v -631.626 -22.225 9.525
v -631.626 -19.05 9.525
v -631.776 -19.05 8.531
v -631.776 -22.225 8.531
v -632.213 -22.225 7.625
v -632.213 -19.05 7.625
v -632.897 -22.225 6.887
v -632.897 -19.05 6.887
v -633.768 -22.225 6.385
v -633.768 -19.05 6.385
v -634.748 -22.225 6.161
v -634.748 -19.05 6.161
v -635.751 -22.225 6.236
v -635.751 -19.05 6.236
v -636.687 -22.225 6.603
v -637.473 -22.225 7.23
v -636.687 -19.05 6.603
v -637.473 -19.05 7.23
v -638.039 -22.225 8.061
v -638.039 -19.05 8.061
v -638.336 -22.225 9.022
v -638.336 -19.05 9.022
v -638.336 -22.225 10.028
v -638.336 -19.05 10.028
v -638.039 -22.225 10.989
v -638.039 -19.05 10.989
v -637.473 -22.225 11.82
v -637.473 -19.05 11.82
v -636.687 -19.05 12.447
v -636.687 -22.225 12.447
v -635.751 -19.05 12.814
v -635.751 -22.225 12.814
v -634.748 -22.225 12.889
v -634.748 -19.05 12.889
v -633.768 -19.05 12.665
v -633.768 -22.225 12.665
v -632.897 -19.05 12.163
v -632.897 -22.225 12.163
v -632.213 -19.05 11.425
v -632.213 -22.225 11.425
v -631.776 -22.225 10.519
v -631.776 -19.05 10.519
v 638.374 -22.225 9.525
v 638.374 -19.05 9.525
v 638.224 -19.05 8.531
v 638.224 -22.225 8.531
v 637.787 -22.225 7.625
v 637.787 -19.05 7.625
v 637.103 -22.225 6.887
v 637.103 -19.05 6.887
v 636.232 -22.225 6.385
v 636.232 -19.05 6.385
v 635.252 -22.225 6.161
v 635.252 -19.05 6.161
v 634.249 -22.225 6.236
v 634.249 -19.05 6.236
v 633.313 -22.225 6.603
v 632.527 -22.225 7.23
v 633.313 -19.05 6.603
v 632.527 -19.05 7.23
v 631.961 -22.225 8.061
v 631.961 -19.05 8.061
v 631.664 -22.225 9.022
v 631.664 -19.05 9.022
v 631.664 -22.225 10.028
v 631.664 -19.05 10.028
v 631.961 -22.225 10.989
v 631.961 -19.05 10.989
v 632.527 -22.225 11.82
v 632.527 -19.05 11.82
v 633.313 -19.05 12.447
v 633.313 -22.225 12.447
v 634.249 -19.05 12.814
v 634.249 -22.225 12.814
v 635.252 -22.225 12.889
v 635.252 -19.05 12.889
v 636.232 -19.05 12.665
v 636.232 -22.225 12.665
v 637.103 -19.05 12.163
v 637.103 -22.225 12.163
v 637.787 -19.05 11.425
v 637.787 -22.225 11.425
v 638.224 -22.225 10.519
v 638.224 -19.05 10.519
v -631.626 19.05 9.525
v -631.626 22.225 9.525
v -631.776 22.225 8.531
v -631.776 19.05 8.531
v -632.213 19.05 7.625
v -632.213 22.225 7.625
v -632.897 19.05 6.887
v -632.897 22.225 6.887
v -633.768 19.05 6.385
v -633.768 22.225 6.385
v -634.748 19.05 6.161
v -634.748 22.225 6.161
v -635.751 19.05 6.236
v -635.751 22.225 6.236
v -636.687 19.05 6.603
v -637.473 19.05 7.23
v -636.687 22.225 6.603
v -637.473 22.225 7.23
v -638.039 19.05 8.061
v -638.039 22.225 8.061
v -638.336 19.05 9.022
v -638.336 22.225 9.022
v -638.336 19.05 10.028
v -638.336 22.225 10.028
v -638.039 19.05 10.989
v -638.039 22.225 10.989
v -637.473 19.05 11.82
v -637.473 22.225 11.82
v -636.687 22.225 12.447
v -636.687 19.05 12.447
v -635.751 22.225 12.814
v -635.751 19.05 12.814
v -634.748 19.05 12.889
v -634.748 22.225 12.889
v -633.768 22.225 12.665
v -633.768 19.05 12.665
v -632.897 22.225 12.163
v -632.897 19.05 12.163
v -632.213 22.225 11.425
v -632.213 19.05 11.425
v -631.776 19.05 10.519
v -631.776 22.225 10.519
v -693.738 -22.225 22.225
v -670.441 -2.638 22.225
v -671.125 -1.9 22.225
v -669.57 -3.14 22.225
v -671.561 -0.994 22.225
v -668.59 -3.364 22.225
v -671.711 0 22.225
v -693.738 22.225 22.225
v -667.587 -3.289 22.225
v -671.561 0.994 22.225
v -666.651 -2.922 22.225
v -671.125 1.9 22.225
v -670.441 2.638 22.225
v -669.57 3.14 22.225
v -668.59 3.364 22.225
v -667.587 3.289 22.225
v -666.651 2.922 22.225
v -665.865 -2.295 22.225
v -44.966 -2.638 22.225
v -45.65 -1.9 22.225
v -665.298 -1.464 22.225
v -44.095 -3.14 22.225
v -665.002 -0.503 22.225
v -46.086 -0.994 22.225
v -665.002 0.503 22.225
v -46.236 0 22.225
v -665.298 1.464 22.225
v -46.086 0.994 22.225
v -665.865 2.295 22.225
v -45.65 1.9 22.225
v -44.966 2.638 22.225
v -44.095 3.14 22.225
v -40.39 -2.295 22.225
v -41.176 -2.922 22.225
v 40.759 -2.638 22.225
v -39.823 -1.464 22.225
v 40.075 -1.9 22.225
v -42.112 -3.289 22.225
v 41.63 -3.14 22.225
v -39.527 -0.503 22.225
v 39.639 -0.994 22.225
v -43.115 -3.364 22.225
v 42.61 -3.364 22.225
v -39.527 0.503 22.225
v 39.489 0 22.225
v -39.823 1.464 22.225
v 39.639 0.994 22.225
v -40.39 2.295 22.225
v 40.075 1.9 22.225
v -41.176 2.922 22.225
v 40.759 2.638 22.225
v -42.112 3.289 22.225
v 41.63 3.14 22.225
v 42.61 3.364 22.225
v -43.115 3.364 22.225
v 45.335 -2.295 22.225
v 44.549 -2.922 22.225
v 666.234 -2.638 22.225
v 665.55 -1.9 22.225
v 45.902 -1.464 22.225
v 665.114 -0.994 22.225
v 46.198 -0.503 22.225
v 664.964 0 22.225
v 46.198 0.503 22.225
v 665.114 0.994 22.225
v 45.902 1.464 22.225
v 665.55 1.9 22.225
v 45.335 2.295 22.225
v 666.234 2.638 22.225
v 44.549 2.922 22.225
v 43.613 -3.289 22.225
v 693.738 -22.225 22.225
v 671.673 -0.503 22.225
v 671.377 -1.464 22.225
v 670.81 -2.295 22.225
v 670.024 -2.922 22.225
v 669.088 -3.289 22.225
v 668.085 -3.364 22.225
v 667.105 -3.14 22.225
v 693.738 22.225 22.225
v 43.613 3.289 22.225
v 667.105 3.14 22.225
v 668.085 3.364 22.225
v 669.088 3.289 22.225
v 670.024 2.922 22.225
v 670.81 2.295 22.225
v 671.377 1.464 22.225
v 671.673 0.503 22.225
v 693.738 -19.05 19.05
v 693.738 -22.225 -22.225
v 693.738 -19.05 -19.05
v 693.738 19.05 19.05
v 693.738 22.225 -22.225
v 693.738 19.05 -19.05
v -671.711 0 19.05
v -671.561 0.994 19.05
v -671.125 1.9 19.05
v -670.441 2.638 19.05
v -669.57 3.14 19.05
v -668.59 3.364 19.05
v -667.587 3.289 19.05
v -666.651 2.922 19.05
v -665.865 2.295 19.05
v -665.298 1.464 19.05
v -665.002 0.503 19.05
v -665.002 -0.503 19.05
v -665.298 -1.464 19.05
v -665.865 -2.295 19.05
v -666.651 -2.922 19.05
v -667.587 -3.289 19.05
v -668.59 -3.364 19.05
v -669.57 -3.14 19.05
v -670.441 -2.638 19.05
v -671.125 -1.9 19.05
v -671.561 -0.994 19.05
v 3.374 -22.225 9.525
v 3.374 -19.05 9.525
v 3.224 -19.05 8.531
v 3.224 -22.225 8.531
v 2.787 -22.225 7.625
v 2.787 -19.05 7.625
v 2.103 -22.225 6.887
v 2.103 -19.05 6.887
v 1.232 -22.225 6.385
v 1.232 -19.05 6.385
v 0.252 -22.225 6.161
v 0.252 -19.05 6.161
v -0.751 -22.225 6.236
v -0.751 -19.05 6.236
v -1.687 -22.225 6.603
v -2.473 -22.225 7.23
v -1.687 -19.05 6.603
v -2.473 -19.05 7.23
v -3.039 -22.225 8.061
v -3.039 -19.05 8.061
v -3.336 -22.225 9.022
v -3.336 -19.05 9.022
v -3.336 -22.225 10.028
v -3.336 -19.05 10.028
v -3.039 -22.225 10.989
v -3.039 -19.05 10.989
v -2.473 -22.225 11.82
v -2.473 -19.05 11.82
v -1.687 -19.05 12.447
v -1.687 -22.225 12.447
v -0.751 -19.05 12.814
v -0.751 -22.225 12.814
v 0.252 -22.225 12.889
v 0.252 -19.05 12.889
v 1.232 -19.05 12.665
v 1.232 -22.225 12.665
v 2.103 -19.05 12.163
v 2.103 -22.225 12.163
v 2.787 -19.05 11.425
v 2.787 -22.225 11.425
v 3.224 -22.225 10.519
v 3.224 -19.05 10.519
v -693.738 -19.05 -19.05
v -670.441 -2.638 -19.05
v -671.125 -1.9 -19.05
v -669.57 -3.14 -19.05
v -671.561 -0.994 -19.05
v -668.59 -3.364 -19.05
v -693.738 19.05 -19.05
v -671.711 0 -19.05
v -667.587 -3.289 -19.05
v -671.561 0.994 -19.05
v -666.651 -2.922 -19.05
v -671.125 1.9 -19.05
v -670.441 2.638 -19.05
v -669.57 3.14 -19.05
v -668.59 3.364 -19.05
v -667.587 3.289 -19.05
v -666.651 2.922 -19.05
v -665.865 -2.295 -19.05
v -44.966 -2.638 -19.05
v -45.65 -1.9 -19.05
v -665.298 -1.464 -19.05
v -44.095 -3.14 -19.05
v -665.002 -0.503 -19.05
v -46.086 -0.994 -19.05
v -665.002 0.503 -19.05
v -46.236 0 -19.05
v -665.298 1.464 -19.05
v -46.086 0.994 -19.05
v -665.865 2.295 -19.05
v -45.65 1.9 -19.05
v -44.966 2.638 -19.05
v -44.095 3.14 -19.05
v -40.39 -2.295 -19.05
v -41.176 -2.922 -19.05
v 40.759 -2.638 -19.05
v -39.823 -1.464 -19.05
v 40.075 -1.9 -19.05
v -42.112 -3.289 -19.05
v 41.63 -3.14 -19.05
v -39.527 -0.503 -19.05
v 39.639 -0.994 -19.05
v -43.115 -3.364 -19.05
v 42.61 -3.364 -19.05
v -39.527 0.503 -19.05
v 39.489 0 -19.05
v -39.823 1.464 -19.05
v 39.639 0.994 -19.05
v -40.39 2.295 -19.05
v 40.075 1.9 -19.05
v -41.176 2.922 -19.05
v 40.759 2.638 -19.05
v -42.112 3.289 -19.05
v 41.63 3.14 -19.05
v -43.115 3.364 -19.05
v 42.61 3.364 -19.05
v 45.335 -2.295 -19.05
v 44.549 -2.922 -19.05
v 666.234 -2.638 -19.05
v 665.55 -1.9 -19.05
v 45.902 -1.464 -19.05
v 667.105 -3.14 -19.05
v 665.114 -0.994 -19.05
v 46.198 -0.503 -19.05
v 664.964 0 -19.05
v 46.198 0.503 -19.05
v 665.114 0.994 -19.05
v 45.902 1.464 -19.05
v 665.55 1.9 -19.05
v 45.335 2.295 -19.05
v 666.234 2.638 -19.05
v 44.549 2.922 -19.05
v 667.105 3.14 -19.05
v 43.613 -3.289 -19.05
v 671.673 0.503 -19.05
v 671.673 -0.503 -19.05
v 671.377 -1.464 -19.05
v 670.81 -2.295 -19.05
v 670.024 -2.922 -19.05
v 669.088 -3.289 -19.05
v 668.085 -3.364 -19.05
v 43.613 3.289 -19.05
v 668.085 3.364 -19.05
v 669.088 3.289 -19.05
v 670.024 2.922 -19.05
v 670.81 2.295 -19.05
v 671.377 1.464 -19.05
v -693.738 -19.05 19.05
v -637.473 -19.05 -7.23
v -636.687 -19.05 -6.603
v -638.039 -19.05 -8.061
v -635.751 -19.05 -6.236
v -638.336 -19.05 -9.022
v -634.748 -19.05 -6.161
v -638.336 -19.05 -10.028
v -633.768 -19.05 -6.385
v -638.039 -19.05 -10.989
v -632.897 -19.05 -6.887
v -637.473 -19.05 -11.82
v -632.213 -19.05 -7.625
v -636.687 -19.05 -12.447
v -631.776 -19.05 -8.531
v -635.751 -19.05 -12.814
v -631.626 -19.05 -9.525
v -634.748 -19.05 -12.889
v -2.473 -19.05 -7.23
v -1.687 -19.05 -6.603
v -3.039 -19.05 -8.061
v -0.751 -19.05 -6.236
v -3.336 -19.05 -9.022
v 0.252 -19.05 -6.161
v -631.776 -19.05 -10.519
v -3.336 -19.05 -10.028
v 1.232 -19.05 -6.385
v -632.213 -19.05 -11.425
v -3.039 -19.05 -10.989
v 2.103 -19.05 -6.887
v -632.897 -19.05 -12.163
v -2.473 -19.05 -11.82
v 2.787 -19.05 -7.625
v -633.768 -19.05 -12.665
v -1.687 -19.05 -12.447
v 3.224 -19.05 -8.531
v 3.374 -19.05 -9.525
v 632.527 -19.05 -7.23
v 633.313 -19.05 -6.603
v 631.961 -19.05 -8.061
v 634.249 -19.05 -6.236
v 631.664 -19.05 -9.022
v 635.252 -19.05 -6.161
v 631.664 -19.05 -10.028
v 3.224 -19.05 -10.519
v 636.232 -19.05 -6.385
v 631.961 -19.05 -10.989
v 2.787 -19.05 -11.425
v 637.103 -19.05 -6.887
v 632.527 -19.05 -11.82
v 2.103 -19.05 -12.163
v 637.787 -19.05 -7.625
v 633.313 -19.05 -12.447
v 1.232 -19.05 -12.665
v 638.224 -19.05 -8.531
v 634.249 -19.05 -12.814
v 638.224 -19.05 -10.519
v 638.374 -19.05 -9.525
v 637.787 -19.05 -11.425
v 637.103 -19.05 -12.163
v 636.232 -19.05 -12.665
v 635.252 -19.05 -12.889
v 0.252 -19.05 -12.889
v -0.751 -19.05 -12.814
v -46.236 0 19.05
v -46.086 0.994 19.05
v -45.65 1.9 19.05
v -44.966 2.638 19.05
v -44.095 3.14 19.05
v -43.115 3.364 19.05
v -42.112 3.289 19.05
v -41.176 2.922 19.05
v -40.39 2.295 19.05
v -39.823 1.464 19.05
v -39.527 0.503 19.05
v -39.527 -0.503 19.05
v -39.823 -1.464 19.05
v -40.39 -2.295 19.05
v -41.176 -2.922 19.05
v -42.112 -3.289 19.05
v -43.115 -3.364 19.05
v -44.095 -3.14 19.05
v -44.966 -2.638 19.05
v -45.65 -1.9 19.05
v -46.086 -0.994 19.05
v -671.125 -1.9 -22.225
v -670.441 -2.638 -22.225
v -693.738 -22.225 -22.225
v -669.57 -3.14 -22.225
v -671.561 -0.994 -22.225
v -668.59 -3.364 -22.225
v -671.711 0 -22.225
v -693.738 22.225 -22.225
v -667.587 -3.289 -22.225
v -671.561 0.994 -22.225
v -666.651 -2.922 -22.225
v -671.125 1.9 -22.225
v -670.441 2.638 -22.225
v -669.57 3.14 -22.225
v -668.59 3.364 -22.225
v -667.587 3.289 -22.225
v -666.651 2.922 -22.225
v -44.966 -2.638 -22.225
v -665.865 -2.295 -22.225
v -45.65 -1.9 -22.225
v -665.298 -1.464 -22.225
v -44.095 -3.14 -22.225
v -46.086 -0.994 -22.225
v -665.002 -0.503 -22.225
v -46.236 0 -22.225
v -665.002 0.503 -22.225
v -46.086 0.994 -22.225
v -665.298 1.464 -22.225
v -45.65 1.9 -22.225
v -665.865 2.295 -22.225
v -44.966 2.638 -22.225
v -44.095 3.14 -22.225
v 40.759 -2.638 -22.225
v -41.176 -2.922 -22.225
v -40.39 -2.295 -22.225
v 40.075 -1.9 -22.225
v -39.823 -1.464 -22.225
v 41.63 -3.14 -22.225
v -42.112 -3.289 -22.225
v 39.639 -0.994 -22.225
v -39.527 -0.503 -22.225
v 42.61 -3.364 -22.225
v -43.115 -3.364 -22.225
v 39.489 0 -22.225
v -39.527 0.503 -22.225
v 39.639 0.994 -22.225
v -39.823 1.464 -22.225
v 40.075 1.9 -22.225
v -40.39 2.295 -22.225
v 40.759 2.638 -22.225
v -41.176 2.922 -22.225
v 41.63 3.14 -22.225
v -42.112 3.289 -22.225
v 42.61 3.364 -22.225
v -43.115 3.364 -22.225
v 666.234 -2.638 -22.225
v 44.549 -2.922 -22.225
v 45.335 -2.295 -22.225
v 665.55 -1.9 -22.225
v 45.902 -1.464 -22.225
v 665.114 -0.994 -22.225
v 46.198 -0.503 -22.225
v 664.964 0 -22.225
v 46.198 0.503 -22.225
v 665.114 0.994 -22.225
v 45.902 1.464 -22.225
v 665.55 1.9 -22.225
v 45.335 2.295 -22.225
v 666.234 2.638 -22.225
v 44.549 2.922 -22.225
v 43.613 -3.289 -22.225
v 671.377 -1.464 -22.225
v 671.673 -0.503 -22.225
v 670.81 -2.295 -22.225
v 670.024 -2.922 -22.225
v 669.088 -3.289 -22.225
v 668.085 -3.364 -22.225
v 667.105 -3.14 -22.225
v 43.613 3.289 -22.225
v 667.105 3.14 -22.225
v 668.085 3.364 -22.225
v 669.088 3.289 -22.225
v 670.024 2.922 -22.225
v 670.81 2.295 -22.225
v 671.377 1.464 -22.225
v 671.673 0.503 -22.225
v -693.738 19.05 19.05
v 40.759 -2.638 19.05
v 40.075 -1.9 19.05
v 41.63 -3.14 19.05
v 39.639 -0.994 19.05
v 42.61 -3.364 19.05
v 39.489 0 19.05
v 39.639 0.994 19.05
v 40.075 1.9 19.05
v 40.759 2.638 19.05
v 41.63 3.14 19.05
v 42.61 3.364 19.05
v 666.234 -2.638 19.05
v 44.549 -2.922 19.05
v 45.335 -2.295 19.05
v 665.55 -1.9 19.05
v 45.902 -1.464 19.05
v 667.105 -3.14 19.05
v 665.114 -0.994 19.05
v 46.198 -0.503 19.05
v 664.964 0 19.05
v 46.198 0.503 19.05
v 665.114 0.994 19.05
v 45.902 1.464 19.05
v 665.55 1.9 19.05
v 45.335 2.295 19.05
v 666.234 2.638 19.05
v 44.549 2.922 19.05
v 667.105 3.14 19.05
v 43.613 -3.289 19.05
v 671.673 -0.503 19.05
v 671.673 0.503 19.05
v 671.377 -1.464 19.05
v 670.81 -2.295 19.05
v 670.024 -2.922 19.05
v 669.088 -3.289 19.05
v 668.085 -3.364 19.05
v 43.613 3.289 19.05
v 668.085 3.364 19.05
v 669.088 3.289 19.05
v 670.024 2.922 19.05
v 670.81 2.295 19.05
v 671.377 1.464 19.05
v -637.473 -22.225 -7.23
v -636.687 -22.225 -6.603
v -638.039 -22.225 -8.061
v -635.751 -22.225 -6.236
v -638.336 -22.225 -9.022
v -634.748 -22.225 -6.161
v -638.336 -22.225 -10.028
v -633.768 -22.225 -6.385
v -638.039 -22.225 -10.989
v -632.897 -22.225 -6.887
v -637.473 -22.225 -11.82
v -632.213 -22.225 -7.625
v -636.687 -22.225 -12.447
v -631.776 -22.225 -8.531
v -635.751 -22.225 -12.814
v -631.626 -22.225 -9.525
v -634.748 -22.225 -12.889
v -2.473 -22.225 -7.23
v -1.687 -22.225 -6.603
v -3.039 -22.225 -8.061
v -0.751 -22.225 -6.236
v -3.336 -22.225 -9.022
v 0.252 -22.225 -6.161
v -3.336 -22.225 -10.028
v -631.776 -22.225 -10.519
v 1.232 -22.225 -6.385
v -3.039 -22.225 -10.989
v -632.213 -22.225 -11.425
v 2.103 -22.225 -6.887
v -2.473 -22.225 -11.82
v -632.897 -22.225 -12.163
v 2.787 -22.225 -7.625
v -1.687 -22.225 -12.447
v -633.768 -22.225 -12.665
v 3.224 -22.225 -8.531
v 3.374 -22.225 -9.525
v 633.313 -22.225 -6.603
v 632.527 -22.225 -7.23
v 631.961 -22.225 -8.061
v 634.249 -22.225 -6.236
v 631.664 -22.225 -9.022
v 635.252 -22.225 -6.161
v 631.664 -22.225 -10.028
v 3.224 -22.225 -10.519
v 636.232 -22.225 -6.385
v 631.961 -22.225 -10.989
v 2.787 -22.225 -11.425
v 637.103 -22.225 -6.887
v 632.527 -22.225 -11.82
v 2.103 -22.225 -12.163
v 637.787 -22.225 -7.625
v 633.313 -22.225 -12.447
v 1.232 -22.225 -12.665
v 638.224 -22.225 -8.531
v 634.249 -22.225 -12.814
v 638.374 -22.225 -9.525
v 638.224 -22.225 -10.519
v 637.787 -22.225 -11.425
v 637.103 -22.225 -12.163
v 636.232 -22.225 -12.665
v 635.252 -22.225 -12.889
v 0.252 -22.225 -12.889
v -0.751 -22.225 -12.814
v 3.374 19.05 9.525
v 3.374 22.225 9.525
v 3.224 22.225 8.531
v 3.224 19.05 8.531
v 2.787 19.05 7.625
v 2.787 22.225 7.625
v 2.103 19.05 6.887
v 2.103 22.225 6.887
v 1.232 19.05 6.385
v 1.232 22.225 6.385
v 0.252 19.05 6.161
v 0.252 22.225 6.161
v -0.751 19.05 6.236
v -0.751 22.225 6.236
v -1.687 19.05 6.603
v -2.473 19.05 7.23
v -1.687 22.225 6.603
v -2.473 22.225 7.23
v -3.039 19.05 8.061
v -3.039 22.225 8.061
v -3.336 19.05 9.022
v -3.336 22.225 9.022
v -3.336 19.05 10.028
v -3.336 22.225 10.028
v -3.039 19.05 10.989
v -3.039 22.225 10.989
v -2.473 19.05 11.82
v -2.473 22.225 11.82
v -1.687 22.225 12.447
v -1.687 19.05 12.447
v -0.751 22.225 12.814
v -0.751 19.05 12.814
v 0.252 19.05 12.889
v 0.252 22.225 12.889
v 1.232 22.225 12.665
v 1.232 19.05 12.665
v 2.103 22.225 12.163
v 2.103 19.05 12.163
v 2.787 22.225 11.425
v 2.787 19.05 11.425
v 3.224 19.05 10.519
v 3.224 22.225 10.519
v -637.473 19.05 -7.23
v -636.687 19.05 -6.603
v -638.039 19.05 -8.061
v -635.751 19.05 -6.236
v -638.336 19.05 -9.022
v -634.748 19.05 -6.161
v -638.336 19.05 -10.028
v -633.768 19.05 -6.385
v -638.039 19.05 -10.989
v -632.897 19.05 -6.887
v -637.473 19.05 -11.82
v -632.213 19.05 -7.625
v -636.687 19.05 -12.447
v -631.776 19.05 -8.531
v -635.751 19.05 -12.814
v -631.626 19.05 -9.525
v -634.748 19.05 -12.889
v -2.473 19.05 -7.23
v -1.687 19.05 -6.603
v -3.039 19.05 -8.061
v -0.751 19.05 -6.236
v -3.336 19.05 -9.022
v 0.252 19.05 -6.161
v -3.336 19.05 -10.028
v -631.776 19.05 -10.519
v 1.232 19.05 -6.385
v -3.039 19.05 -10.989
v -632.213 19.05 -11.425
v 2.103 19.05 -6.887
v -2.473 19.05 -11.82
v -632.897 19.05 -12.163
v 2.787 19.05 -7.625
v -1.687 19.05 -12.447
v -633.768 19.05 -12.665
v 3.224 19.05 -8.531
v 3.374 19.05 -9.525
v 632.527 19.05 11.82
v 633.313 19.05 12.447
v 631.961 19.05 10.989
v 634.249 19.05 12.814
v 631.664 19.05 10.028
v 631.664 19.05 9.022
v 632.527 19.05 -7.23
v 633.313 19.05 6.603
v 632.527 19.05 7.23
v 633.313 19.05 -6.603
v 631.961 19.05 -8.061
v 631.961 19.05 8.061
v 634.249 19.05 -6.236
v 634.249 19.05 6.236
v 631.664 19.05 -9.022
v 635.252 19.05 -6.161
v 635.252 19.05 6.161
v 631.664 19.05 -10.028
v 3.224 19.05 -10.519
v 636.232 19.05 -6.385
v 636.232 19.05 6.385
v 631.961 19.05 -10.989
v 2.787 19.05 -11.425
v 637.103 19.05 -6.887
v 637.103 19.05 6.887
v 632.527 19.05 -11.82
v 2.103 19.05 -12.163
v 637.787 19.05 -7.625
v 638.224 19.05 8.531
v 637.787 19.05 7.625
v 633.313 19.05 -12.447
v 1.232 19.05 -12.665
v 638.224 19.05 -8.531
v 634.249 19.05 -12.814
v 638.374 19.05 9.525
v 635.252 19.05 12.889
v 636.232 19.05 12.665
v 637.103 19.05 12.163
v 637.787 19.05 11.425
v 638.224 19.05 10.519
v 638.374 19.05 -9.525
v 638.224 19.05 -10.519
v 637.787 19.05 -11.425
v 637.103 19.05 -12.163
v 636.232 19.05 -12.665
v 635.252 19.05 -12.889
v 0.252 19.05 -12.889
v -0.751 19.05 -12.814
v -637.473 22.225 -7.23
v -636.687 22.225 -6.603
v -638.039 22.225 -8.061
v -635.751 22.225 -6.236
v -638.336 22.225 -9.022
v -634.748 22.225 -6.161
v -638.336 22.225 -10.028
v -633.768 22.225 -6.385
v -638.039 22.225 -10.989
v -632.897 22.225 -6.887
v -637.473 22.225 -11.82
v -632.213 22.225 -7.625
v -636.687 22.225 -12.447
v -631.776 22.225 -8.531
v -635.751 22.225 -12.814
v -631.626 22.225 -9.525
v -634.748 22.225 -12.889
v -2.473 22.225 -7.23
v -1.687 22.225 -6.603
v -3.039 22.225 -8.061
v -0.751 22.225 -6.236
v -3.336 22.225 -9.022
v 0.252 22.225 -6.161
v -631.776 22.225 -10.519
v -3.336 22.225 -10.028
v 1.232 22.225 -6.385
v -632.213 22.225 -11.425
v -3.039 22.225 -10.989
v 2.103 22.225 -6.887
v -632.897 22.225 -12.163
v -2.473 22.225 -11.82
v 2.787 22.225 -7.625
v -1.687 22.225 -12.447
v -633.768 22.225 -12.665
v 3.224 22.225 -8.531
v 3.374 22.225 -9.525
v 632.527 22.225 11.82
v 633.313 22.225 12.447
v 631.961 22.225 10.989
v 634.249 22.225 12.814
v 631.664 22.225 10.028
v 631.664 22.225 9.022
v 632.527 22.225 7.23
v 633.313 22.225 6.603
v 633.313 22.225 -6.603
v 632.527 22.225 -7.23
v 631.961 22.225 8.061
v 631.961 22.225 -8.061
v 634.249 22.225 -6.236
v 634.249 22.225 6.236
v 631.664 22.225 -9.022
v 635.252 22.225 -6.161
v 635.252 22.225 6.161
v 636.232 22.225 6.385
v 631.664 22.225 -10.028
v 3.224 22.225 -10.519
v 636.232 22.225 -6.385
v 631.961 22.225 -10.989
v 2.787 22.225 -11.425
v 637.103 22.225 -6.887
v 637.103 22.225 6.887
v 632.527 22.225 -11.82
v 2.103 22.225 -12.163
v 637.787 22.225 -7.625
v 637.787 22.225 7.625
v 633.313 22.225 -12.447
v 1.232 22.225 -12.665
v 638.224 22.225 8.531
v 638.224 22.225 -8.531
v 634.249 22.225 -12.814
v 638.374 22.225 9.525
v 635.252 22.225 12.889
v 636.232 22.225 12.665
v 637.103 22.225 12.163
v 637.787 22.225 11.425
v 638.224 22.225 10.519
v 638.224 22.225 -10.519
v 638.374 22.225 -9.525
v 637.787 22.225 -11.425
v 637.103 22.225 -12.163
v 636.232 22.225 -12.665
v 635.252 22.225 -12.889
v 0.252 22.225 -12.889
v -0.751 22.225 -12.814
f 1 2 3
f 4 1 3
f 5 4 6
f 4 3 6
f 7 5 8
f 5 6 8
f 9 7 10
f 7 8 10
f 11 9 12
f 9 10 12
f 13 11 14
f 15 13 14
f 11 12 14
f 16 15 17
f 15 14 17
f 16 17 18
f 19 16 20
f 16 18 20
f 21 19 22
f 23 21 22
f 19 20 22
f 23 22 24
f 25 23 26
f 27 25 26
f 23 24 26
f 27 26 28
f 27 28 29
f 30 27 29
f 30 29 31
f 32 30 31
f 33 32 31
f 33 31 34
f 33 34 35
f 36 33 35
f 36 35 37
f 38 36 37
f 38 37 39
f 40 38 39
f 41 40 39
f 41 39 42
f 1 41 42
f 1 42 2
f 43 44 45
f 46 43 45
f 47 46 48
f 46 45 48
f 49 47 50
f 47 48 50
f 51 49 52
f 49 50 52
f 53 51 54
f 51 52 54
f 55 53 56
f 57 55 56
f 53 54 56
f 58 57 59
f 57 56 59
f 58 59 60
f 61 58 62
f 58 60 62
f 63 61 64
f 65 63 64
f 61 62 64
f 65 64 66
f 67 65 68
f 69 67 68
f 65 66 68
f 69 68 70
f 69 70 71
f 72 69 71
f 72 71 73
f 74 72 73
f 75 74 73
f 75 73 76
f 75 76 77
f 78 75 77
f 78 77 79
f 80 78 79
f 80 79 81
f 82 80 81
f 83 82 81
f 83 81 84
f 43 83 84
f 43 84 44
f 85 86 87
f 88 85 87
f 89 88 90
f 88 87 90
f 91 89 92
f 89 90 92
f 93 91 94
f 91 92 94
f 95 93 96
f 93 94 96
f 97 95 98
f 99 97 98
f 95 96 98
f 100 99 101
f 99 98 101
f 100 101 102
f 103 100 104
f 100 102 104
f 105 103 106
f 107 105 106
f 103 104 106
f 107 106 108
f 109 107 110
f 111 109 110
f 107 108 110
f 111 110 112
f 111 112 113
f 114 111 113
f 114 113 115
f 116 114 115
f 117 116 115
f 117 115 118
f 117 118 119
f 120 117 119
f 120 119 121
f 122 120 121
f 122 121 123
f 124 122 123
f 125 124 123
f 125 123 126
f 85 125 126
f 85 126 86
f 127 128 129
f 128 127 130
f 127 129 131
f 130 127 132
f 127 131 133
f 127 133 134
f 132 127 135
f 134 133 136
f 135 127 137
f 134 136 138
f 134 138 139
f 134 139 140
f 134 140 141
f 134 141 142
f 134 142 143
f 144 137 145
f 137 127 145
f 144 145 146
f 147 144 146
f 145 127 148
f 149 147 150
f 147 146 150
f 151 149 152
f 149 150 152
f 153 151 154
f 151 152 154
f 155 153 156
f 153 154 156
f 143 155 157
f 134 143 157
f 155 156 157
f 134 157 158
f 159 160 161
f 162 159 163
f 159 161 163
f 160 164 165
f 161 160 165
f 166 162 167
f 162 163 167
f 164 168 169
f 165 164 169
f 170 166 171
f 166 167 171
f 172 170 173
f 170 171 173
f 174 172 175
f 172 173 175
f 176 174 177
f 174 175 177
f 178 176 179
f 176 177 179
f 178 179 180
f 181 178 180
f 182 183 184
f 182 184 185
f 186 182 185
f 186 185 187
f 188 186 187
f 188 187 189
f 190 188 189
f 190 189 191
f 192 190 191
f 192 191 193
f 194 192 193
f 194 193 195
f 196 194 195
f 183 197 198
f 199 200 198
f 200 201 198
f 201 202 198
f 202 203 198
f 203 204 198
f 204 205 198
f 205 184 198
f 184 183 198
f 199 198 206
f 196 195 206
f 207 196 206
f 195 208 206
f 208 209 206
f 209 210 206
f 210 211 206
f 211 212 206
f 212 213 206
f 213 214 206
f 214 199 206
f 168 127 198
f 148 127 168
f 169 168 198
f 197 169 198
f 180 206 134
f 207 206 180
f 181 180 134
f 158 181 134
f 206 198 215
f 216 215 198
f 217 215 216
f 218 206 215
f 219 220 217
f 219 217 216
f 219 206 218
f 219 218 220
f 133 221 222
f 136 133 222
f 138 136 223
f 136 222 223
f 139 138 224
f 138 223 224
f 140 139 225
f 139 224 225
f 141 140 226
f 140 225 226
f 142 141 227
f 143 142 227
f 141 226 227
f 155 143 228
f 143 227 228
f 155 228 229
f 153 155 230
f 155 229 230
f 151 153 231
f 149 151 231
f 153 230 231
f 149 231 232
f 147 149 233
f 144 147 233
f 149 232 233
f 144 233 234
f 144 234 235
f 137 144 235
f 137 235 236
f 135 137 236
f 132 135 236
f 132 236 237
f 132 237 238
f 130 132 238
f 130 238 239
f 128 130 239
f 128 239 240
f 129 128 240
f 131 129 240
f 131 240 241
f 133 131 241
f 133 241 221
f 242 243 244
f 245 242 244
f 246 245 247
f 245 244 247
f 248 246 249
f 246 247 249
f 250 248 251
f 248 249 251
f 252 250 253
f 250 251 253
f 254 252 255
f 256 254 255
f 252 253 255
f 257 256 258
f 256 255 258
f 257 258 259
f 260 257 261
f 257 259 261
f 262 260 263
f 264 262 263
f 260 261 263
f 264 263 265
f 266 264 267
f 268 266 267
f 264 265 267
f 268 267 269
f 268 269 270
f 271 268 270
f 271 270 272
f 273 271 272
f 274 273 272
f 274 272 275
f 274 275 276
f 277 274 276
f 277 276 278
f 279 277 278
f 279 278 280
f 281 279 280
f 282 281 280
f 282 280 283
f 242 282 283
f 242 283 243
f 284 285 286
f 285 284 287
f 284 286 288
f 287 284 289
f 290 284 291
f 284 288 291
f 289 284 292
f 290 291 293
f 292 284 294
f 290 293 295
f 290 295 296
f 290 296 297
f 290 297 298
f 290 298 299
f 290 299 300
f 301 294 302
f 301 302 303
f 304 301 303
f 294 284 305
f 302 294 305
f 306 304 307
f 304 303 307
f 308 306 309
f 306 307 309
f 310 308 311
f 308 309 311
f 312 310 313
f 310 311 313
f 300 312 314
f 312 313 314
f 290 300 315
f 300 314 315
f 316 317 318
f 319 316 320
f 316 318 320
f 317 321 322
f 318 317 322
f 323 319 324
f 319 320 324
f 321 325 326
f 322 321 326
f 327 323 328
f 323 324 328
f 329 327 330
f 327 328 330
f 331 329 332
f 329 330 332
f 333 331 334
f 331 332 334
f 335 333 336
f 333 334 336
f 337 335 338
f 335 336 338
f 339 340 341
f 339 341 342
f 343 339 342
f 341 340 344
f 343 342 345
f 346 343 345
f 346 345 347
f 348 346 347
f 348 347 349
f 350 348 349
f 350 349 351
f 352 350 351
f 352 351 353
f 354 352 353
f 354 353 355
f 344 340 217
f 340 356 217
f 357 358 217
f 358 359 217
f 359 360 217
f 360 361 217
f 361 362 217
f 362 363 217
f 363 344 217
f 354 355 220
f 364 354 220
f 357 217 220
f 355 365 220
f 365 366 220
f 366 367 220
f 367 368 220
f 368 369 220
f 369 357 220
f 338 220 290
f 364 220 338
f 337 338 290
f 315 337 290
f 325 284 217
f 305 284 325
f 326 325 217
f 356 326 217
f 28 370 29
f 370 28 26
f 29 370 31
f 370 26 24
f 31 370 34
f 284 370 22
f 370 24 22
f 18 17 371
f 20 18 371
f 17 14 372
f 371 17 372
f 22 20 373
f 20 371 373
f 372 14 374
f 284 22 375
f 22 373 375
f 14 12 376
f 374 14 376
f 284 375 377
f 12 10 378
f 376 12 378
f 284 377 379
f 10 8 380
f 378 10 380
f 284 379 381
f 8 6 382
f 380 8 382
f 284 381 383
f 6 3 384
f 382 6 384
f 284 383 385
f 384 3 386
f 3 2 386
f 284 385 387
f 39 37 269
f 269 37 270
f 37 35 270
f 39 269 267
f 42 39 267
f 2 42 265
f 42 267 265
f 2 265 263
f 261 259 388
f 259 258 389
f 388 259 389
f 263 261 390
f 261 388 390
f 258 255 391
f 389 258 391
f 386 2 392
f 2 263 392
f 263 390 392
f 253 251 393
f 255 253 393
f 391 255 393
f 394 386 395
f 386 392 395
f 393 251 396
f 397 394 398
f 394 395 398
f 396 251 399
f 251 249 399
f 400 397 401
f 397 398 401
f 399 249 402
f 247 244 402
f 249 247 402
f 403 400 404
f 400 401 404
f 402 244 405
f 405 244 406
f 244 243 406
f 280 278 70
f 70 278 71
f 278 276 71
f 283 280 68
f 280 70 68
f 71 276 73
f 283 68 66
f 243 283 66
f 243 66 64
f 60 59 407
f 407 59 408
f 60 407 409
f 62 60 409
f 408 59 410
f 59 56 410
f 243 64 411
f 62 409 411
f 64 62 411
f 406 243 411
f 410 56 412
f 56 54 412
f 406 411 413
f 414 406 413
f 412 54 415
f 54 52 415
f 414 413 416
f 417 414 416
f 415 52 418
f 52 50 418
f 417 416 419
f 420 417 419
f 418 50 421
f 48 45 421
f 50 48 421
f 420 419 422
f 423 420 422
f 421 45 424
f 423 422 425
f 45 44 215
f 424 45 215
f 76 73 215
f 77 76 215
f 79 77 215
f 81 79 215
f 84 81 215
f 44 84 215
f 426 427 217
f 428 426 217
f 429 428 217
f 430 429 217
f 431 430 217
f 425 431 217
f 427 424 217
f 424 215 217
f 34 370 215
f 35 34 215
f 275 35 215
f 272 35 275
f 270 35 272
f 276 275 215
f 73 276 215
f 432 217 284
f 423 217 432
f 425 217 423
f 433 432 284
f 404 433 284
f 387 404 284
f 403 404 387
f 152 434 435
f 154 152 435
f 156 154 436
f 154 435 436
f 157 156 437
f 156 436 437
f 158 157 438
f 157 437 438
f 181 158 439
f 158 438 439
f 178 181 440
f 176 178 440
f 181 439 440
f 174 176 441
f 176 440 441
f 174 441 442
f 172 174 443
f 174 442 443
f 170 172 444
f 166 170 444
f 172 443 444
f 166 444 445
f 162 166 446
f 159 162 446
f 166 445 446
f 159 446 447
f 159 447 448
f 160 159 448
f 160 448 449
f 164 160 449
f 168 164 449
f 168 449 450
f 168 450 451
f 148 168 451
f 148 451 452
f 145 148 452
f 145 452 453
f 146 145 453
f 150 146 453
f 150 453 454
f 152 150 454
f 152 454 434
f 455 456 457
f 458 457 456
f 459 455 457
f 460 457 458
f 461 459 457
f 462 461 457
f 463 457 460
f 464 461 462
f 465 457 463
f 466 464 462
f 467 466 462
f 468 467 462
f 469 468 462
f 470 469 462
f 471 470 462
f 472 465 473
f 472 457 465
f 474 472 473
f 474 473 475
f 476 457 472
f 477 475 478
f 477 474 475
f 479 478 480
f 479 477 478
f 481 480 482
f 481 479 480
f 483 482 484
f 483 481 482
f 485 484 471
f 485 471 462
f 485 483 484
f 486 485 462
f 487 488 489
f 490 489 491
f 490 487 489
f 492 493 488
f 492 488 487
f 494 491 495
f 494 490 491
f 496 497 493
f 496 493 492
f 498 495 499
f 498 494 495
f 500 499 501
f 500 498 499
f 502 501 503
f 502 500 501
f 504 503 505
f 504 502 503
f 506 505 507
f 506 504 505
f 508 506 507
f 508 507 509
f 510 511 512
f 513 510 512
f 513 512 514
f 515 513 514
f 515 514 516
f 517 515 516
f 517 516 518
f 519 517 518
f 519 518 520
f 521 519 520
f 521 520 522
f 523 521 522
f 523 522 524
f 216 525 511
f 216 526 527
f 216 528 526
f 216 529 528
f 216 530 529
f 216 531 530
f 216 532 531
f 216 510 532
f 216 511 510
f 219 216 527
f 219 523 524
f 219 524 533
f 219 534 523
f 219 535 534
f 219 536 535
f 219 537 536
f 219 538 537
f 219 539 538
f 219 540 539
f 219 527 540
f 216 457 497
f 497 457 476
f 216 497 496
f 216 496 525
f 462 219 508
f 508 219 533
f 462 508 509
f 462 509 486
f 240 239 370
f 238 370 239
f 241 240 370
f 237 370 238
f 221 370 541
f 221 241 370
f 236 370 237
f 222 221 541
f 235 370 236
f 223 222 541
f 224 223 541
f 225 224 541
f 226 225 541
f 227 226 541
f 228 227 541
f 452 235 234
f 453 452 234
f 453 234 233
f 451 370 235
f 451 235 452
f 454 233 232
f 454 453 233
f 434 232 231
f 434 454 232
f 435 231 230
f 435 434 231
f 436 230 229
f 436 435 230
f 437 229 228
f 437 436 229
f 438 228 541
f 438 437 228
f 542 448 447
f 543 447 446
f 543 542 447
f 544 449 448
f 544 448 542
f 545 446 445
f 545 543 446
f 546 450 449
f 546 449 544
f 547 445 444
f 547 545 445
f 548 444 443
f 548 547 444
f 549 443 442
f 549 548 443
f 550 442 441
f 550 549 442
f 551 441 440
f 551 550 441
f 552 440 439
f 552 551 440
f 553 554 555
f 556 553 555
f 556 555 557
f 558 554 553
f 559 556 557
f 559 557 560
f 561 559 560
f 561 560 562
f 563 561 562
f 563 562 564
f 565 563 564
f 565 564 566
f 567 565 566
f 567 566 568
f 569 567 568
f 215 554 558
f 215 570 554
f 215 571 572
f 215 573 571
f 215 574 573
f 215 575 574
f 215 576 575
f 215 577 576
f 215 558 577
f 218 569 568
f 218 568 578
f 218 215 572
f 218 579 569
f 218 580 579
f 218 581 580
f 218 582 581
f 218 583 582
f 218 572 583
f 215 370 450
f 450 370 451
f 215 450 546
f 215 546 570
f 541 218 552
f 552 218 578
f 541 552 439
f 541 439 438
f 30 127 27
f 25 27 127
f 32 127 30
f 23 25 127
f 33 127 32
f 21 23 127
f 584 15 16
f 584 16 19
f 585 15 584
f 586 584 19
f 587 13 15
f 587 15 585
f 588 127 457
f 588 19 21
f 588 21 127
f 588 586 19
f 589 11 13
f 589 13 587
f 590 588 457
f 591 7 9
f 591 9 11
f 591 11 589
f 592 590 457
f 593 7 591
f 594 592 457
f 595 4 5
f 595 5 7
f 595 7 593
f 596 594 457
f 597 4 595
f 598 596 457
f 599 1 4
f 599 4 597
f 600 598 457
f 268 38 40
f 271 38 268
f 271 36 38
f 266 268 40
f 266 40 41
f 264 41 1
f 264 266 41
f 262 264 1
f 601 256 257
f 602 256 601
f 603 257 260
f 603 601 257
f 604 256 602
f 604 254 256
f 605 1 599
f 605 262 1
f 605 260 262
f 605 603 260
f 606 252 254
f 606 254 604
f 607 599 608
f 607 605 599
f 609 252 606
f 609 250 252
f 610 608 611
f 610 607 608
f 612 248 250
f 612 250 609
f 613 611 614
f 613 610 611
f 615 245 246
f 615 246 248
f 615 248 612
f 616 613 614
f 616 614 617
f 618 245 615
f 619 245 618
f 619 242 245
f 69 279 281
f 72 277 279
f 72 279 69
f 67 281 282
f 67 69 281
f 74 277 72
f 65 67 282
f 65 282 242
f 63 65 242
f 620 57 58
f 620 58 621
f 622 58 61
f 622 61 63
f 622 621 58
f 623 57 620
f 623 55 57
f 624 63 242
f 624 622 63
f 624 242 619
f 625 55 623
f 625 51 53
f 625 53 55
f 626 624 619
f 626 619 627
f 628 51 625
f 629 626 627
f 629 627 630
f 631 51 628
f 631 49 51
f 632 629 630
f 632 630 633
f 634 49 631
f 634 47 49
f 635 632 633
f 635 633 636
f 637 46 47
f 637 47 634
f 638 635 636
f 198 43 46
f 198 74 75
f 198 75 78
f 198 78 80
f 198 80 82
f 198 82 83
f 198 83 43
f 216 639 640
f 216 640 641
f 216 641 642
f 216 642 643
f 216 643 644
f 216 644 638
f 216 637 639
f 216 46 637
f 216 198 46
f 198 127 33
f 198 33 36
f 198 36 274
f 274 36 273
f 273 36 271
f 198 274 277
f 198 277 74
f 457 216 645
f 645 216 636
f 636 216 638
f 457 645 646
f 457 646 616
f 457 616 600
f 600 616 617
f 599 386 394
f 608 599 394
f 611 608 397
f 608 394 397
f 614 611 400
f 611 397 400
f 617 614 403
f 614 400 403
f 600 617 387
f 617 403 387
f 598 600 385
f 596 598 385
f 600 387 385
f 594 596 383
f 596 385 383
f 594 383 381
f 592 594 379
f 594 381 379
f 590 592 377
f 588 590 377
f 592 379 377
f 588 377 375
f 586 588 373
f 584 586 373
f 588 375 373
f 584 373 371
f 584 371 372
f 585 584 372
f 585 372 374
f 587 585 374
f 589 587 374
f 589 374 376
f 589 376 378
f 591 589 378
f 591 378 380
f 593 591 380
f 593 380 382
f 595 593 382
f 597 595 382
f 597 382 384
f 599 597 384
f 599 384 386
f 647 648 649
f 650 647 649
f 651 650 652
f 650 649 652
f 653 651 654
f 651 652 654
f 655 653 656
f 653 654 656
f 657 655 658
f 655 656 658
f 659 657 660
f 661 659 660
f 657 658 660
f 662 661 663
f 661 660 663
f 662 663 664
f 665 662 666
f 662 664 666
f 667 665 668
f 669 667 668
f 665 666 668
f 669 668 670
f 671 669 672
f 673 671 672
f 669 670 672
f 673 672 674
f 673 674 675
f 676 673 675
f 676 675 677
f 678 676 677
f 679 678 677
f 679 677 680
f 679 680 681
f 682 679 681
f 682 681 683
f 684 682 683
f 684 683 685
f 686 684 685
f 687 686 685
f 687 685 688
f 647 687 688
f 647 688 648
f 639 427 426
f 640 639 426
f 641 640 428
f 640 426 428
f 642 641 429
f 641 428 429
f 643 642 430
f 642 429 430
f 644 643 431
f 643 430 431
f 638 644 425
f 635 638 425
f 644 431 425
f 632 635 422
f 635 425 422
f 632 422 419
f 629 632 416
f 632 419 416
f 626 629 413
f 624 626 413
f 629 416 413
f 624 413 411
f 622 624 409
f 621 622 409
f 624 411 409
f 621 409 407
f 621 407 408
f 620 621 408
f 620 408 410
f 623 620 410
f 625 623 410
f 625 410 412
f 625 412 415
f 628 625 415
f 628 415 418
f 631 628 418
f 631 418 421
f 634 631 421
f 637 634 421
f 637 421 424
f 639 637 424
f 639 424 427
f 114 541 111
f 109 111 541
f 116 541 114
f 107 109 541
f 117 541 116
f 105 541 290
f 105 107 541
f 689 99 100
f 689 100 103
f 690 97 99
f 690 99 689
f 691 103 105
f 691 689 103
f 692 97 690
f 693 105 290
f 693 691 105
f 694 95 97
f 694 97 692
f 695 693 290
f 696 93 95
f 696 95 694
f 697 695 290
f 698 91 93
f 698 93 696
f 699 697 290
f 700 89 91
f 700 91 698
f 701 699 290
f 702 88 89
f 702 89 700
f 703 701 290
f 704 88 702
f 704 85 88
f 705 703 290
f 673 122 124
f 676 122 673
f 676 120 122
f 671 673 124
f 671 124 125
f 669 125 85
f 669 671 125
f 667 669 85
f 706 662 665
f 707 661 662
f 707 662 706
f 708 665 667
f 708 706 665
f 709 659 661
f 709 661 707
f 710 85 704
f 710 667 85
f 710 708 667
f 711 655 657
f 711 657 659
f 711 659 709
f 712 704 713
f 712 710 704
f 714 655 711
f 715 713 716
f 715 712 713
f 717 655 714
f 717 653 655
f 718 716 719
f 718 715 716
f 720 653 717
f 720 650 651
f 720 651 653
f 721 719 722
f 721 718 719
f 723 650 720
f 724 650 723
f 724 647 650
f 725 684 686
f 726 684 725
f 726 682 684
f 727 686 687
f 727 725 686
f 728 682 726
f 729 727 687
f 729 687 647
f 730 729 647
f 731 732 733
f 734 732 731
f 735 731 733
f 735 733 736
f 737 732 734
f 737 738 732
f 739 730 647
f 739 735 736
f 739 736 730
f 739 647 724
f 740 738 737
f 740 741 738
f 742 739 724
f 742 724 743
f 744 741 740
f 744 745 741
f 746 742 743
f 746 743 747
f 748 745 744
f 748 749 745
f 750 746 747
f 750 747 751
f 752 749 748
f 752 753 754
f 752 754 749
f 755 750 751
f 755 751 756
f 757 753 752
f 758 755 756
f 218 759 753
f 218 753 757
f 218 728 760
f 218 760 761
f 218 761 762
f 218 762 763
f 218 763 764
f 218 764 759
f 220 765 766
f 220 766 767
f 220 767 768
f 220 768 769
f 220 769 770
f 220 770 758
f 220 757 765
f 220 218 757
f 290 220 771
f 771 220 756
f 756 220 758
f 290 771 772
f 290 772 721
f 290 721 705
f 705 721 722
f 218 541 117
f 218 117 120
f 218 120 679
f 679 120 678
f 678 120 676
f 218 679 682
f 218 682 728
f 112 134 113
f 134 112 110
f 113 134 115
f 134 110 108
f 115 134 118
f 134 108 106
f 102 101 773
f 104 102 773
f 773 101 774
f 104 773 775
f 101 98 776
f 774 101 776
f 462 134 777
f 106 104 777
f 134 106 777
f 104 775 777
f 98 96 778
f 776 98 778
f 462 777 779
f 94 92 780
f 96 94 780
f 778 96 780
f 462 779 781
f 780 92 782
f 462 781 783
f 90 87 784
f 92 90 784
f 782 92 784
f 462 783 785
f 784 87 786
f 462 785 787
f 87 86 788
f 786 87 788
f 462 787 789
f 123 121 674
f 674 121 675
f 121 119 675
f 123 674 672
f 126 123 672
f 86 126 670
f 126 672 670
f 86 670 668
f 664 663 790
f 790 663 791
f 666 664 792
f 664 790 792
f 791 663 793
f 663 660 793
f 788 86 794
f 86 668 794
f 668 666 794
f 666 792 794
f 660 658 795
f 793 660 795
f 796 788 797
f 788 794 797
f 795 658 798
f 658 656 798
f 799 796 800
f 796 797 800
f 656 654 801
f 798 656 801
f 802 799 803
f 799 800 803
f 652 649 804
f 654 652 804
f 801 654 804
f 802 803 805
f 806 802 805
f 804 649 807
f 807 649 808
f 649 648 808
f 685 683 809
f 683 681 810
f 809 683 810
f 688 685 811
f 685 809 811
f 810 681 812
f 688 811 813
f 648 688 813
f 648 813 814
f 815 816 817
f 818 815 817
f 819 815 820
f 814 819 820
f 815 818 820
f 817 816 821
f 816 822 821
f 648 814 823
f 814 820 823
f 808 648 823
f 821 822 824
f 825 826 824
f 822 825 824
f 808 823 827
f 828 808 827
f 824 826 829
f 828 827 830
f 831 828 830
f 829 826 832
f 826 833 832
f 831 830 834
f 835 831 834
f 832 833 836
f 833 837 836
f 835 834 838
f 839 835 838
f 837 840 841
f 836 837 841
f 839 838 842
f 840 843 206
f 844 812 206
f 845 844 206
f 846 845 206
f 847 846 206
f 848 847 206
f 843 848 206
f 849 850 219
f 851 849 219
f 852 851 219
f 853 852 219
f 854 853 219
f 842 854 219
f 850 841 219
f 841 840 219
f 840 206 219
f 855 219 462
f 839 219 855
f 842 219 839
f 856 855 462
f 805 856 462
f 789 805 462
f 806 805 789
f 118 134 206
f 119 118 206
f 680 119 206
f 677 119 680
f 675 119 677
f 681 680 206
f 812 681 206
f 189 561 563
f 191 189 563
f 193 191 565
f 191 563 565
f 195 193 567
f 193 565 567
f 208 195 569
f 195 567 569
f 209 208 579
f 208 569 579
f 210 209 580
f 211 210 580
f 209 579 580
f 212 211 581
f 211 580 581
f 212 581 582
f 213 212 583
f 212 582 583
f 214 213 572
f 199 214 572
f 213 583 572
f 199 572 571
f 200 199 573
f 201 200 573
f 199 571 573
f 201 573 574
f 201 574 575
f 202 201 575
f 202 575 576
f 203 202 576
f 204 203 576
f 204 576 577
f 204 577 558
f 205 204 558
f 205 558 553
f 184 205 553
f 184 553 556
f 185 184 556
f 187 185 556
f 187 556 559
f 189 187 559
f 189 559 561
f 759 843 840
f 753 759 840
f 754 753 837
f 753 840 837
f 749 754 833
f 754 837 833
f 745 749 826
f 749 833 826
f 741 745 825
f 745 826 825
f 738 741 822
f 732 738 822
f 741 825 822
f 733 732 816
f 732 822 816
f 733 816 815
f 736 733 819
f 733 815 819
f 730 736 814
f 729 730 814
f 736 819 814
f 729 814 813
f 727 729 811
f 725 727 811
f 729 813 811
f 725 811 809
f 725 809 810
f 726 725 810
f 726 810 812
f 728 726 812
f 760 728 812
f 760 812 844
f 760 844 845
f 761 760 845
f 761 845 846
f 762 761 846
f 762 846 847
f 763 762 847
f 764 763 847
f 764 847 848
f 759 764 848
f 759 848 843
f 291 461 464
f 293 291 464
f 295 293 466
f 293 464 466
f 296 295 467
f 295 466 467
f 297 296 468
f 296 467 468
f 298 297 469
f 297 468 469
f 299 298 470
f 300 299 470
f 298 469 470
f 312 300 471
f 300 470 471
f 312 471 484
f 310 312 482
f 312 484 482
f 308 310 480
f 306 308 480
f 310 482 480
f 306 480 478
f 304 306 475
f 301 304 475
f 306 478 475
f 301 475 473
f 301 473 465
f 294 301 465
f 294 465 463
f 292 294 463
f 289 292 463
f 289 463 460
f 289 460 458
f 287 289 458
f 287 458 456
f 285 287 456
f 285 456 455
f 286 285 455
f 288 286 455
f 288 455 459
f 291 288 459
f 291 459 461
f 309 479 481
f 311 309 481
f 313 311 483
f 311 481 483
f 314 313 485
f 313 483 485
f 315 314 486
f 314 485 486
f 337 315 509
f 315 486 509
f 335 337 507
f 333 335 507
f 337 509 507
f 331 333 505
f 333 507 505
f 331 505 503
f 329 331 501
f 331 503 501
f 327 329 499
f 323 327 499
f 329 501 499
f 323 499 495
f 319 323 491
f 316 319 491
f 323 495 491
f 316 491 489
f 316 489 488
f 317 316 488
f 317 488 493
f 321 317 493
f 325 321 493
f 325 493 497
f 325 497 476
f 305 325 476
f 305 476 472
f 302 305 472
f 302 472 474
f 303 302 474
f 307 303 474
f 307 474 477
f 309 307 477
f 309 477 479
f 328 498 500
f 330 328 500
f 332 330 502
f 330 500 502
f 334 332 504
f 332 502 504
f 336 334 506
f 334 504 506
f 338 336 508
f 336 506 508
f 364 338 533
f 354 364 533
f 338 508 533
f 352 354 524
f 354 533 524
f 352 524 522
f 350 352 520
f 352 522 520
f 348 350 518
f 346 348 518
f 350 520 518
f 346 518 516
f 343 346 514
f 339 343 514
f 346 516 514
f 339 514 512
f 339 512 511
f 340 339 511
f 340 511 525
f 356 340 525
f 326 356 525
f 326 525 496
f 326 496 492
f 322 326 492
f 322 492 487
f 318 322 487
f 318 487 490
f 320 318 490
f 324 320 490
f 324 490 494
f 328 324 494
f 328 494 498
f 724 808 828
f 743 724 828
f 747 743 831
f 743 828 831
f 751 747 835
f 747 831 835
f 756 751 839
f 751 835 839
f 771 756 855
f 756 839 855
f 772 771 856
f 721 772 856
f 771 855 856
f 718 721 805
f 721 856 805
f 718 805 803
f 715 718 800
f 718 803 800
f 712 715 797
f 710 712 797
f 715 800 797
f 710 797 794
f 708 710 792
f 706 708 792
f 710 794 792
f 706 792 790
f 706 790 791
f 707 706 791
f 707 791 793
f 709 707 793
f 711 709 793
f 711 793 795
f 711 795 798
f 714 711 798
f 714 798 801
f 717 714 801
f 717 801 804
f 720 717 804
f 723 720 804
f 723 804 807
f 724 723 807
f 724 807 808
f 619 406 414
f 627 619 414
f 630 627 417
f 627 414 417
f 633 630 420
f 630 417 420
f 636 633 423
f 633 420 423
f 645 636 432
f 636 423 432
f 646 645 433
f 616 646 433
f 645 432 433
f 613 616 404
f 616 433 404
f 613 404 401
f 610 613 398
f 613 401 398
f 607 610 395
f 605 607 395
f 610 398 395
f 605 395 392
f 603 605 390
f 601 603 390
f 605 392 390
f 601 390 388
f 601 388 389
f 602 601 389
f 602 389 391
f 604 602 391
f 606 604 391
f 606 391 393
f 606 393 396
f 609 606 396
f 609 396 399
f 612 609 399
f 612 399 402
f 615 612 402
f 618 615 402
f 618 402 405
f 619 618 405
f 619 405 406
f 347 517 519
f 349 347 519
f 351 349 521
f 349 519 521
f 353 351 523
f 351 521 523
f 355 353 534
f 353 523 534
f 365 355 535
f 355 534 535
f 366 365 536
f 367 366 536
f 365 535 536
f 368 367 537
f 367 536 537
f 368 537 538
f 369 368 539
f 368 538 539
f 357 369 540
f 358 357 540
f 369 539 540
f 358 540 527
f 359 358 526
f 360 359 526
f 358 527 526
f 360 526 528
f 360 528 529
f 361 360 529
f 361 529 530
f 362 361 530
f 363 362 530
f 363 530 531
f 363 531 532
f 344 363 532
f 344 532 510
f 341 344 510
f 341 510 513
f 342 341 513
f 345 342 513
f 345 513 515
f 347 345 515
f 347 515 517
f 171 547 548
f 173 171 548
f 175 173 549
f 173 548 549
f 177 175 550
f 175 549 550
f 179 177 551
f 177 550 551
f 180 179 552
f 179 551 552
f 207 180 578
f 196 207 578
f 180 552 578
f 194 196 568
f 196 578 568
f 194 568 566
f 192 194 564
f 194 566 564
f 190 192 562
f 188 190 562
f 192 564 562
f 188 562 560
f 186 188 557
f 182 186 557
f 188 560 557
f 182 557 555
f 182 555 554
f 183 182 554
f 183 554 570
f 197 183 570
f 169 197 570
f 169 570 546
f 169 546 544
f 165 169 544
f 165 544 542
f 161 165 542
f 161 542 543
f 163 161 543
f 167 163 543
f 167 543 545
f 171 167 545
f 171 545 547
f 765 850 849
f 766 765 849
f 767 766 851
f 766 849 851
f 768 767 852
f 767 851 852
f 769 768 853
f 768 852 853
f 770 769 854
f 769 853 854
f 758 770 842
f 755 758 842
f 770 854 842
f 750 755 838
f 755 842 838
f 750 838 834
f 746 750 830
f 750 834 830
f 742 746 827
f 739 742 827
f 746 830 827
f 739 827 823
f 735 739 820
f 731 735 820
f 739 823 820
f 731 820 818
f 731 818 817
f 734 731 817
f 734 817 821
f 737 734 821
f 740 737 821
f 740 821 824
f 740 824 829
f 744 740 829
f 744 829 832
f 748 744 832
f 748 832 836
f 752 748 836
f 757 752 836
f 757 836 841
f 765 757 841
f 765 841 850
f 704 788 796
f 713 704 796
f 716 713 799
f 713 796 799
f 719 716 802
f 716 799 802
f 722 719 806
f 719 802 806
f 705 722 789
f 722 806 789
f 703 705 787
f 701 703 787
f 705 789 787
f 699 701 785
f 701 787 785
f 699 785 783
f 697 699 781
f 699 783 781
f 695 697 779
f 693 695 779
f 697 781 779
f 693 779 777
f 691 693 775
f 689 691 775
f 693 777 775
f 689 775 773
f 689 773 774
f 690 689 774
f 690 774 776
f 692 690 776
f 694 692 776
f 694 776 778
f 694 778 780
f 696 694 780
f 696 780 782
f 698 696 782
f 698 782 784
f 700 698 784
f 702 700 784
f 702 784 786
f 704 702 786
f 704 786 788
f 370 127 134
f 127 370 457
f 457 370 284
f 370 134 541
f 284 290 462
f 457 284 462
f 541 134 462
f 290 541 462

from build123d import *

# Parameters (mm, degrees)
BOSS_EXTRUDE1_DEPTH              = 693.7375
BOSS_EXTRUDE1_DEPTH_BACK         = 693.7375
SKETCH1_W                        = 44.45
SKETCH1_H                        = 44.45
SKETCH1_W_2                      = 38.1
SKETCH1_H_2                      = 38.1
F_17_64_0_26563_DIAMETER_HOLE2_D = 6.747002
F_17_64_0_26563_DIAMETER_HOLE1_D = 6.747002


with BuildPart() as part:
    # Sketch1 → Boss-Extrude1 (new, two sides: drawn at the far end of the back side and taken through both)
    with BuildSketch(Plane(origin=(0, 0, 0), x_dir=(0, 0, -1), z_dir=(1, 0, 0)).offset(-BOSS_EXTRUDE1_DEPTH_BACK)):
        Rectangle(SKETCH1_W, SKETCH1_H)
        Rectangle(SKETCH1_W_2, SKETCH1_H_2, mode=Mode.SUBTRACT)
    extrude(amount=BOSS_EXTRUDE1_DEPTH + BOSS_EXTRUDE1_DEPTH_BACK)

    # 17/64 (0.26563) Diameter Hole2 (through all)
    with Locations(Plane.XY.offset(22.225)):
        with Locations((42.8625, 0), (-668.3375, 0), (668.3375, 0), (-42.8625, 0)):
            Hole(F_17_64_0_26563_DIAMETER_HOLE2_D / 2)

    # 17/64 (0.26563) Diameter Hole1 (through all)
    with Locations(Plane(origin=(0, -22.225, 0), x_dir=(-1, 0, 0), z_dir=(0, -1, 0))):
        with Locations((0, 9.525), (0, -9.525), (-635, 9.525), (-635, -9.525), (635, -9.525), (635, 9.525)):
            Hole(F_17_64_0_26563_DIAMETER_HOLE1_D / 2)


solid = part.part
